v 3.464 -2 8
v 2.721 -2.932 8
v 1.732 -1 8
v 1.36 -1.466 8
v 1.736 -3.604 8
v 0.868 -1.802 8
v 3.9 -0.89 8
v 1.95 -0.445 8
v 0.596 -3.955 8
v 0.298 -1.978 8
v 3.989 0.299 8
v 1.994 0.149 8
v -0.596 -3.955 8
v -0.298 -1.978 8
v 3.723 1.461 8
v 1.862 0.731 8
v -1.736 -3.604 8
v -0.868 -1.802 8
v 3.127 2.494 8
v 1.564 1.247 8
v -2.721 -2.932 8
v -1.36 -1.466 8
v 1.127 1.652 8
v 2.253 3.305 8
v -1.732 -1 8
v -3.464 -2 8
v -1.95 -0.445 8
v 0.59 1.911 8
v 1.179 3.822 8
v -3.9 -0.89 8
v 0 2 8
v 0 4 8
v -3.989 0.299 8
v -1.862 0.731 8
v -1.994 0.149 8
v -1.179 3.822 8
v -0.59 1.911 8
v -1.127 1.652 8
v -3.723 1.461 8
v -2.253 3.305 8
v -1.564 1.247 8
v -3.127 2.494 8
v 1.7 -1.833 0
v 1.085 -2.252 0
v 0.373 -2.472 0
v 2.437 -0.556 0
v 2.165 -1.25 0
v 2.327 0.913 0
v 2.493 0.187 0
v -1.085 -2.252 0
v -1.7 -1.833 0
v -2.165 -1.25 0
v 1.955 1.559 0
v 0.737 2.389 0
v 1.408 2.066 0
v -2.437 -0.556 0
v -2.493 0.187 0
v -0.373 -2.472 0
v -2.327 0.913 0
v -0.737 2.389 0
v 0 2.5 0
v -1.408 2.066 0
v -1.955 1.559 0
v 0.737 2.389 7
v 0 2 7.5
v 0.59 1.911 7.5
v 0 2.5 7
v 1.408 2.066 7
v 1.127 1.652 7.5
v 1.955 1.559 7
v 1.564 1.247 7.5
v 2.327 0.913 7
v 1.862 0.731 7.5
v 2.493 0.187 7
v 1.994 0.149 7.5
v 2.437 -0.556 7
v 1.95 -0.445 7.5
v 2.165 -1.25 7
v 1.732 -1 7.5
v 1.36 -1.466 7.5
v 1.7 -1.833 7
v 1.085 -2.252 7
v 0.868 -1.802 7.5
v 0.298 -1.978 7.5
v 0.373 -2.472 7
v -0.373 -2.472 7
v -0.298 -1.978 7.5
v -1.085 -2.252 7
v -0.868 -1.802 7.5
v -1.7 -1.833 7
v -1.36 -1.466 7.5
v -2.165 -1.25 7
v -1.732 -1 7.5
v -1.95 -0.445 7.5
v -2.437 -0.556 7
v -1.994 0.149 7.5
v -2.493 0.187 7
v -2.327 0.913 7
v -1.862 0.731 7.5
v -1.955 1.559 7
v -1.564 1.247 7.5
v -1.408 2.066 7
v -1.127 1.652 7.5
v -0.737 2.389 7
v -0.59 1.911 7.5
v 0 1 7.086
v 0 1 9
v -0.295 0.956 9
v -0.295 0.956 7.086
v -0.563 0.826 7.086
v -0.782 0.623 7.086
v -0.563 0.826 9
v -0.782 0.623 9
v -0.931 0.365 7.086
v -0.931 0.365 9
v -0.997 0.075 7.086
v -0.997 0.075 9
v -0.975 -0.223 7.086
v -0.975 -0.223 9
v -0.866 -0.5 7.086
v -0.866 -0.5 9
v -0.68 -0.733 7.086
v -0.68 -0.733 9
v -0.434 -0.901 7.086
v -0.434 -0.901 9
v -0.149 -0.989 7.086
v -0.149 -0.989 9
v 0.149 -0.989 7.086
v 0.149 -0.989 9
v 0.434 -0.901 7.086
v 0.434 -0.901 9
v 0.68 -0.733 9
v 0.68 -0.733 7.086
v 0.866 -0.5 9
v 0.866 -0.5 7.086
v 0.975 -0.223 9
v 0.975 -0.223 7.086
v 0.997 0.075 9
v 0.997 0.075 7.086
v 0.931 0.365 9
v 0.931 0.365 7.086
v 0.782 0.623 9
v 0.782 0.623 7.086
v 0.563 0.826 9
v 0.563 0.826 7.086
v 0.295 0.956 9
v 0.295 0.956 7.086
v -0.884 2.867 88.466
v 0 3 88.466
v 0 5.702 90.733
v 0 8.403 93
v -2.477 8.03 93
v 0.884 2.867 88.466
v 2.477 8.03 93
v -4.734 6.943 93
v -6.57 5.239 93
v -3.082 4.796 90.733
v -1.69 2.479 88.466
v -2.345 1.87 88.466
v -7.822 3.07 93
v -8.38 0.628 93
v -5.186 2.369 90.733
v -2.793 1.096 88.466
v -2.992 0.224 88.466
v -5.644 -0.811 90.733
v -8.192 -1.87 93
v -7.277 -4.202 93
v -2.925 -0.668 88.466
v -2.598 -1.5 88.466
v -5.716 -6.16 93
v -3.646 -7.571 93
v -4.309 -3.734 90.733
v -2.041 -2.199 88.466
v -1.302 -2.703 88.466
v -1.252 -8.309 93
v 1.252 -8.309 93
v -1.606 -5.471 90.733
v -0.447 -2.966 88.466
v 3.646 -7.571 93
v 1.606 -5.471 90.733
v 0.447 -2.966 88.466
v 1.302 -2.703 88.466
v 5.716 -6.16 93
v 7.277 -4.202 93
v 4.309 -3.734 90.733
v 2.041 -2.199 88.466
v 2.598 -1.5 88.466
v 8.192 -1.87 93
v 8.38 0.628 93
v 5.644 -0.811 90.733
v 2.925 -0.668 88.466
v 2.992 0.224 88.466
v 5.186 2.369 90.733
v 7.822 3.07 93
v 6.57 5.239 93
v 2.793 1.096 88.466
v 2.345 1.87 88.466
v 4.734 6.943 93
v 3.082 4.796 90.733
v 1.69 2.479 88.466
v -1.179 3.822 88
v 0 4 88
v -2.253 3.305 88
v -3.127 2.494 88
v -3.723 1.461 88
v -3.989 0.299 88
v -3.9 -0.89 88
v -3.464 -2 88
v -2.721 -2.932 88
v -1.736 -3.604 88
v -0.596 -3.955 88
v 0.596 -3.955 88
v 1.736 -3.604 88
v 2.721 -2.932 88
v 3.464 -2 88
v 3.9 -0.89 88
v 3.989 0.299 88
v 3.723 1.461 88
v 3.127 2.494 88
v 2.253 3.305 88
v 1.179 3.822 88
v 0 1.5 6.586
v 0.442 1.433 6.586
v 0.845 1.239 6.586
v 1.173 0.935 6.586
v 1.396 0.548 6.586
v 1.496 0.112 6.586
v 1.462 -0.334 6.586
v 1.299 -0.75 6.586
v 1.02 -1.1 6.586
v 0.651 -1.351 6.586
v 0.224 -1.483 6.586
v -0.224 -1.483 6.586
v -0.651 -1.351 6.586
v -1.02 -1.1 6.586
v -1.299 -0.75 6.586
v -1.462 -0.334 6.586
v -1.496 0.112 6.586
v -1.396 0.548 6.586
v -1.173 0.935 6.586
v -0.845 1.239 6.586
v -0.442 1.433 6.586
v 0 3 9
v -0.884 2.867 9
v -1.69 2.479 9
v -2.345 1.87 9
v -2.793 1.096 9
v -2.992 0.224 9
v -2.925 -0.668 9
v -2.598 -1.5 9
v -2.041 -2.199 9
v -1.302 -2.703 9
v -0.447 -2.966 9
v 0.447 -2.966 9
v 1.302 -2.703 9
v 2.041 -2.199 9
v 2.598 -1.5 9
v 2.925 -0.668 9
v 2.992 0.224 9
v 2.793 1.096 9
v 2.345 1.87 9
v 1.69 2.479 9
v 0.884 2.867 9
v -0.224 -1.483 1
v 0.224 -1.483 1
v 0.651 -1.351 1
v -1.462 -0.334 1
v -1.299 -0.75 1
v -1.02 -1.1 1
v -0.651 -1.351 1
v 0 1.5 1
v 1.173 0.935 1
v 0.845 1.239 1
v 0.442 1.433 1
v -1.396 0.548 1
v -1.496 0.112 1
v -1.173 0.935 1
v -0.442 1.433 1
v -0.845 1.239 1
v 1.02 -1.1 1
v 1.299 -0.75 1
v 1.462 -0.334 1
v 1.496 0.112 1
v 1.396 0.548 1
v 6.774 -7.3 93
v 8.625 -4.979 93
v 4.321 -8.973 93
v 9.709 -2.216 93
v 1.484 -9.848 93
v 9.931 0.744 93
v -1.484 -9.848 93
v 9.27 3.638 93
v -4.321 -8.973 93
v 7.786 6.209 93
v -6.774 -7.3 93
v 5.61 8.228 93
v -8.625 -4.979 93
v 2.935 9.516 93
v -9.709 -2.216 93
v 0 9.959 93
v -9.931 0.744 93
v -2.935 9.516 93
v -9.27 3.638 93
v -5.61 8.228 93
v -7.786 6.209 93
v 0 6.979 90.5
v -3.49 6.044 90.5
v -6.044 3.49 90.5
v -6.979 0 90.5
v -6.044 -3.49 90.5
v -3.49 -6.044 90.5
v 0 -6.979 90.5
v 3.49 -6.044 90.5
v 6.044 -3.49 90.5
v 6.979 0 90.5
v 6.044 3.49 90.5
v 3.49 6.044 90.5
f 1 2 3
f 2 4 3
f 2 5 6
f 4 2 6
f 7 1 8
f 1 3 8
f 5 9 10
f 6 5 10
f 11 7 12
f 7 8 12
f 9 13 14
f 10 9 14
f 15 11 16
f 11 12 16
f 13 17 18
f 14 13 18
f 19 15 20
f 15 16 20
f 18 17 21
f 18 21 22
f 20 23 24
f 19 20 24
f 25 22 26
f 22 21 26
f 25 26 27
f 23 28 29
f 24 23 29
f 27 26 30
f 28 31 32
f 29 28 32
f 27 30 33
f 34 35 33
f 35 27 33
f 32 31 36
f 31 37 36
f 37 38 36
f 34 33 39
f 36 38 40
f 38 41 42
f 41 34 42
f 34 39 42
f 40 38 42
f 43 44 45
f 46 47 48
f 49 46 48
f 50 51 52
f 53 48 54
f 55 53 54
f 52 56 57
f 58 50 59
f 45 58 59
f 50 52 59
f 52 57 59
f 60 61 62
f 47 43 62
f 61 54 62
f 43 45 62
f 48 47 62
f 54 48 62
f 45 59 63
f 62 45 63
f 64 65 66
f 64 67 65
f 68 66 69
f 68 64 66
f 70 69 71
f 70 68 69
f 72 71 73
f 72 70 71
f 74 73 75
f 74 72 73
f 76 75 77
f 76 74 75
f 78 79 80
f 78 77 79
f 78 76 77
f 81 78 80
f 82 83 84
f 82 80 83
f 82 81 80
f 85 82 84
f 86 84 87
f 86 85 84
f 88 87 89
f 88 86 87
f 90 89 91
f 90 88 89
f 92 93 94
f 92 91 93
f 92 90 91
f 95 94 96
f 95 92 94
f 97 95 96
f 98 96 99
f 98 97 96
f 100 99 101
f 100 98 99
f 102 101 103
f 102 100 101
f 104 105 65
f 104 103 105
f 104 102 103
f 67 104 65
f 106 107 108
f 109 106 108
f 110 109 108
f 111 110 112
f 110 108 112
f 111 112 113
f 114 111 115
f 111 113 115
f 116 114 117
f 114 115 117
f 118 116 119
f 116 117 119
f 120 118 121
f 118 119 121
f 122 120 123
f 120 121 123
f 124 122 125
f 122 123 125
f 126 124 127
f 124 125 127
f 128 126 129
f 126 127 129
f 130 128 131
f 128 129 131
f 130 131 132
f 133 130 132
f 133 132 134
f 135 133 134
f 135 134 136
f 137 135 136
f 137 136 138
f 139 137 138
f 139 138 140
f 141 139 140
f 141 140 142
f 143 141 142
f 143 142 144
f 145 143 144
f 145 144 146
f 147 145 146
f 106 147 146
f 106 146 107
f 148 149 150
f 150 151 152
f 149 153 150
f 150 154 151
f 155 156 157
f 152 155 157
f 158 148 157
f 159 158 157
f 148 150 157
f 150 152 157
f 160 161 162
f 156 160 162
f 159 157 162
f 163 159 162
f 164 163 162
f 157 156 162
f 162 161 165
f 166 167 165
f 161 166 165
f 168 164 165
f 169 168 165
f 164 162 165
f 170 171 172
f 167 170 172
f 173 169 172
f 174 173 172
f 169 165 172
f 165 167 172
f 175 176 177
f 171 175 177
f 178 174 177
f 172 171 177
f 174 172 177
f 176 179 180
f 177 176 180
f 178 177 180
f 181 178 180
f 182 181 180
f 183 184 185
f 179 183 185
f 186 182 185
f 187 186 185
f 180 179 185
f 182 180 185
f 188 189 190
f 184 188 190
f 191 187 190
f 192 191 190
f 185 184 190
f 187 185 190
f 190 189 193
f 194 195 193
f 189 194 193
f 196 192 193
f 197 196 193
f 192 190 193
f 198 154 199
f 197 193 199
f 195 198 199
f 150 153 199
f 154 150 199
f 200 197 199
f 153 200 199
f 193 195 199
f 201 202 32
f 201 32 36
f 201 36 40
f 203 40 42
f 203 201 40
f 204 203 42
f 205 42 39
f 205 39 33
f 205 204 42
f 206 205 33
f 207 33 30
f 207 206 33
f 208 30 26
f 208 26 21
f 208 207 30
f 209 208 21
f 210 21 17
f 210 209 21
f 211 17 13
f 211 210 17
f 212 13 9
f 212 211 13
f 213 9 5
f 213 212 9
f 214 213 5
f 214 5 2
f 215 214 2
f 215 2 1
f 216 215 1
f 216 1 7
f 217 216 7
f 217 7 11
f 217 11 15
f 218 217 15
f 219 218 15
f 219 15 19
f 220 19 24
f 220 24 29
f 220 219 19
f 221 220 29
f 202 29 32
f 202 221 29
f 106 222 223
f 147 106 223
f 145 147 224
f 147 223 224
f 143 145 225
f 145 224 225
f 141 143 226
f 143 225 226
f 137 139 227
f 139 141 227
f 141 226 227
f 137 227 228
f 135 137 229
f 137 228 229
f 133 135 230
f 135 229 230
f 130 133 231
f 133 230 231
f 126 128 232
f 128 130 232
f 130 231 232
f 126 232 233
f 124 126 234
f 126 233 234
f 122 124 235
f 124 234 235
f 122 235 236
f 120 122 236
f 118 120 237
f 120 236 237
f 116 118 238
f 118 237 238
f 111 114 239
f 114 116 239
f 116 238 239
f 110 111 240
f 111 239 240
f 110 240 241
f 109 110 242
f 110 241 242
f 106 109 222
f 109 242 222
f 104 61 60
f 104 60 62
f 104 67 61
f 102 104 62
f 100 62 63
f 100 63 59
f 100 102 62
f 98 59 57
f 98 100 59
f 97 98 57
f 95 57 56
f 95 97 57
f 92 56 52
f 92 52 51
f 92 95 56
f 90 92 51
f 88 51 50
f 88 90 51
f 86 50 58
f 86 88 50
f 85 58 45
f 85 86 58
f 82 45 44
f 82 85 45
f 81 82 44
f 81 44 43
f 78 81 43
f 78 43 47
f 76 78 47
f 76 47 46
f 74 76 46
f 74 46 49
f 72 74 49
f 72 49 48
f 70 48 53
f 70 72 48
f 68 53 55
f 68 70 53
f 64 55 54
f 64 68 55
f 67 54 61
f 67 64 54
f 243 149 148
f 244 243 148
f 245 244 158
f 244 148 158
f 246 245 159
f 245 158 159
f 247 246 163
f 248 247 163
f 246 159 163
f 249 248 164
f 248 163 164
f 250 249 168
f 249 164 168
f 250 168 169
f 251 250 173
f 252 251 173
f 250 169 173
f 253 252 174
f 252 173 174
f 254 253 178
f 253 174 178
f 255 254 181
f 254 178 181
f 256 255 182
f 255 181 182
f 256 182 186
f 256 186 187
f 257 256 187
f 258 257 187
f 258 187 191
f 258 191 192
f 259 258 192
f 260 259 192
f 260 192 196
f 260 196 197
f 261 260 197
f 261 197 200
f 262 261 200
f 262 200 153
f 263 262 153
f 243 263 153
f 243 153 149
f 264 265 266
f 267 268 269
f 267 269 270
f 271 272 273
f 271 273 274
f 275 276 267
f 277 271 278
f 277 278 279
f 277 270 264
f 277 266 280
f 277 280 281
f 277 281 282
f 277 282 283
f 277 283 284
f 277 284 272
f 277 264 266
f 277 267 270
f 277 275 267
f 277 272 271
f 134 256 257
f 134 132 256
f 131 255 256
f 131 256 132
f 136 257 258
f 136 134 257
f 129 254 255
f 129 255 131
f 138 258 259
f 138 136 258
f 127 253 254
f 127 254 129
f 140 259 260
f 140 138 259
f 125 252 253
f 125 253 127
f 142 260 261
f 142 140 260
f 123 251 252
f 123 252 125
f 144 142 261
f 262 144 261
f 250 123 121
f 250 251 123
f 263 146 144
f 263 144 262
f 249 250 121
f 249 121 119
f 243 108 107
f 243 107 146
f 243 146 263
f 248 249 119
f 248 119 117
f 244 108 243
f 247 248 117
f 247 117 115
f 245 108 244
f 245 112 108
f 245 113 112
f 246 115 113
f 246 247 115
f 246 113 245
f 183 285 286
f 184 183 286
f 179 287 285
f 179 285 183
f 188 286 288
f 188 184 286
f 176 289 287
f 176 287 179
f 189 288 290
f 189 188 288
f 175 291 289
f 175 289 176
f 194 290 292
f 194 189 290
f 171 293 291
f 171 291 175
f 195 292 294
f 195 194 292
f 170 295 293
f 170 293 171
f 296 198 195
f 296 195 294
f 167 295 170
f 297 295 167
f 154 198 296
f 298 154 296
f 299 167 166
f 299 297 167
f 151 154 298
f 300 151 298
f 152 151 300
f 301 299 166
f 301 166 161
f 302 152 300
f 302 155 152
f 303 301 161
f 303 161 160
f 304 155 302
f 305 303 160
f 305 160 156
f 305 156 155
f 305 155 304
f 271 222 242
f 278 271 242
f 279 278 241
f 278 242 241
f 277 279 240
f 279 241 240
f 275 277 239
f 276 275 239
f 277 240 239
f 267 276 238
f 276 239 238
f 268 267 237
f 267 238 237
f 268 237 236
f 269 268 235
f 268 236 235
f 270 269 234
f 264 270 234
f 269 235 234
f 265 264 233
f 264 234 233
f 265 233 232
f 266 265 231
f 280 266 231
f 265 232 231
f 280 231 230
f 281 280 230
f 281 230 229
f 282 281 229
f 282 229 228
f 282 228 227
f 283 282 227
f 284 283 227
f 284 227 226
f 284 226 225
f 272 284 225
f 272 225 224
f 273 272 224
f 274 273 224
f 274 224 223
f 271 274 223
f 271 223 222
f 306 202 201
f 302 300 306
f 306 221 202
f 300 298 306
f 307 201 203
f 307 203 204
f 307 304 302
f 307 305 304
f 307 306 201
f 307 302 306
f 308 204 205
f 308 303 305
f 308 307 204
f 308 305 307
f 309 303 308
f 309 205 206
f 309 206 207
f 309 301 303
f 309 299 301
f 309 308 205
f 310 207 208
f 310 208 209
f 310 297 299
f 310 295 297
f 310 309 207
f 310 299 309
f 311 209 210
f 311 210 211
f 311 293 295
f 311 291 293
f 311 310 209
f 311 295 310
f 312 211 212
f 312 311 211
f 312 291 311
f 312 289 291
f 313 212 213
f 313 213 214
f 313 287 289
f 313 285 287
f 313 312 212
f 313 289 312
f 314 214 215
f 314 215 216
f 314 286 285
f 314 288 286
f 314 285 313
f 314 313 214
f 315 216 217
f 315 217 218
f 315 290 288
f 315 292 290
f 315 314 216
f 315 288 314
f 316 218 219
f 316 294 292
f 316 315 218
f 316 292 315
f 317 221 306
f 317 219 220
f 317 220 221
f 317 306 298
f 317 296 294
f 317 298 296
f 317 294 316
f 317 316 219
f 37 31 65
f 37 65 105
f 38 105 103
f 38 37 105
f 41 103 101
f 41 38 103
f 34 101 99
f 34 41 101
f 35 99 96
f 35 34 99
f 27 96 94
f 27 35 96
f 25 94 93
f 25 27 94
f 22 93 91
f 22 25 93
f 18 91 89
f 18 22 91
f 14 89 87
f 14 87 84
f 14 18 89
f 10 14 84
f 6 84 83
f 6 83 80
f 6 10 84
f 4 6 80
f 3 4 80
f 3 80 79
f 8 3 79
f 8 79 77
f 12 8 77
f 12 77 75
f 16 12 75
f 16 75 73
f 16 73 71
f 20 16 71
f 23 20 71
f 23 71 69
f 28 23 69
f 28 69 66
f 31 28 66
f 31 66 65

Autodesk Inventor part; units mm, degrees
ref_plane "YZ Plane" through (0, 0, 0) normal (1, 0, 0) x (0, 1, 0)
ref_plane "XZ Plane" through (0, 0, 0) normal (0, 1, 0) x (-1, 0, 0)
ref_plane "XY Plane" through (0, 0, 0) normal (0, 0, 1) x (1, 0, 0)
sketch "Skizze1" plane through (0, 0, 0) normal (1, 0, 0) x (0, 1, 0)
  line L0 (0, 0) -> (2.5, 0)
  line L1 (0, 0) -> (2.5, 0) construction
  line L2 (2.5, 0) -> (2.5, 7)
  line L3 (2.5, 7) -> (2, 7.5)
  line L4 (2, 7.5) -> (2, 8)
  line L5 (2, 8) -> (4, 8)
  line L6 (4, 8) -> (4, 88)
  line L7 (0, 93) -> (9.9588, 93)
  line L8 (9.9588, 93) -> (4, 88)
  line L9 (0, 0) -> (0, 93)
  line L10 (0, -18.6) -> (0, 111.6) projected
  dimension "d0" = 2.5
  dimension "d1" = 0
  dimension "d2" = 7
  dimension "d4" = 0.5
  dimension "d5" = 0.5
  dimension "d6" = 2
  dimension "d7" = 4
  dimension "d23" = 40
  dimension "d24" = 5
  dimension "d25" = 85
revolve "Umdrehung1" add sketch "Skizze1" angle 360 about axis through (0, 0, -10) along (0, 0, 1)
thread "Gewinde1" size "M5x0.8" class "6g" standard "ANSI Metric M Profile" full length
shell "Wandung4" thickness 1 removed faces 1 at (-0.1358, 2.201, 93)
properties part number "Fuss1,0"
